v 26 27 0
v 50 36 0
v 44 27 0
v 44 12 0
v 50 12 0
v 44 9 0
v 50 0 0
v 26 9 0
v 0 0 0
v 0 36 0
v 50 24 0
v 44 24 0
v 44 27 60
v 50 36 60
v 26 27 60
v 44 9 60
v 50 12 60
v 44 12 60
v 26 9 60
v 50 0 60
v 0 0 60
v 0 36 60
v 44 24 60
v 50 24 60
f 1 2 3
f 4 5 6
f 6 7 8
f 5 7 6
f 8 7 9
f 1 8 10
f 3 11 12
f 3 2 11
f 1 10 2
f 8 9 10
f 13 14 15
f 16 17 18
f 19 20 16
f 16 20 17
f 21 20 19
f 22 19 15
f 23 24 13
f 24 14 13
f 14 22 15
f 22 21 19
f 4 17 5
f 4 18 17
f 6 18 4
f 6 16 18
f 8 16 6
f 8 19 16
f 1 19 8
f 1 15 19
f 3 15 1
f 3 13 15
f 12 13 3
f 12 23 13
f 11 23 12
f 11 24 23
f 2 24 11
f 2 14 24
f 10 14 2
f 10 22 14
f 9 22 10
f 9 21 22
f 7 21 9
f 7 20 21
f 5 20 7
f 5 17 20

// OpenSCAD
$fn = 32;

// ----------------------------------------------------------------------
// T-slot rail: 50 x 36 mm section, 60 mm long
// ----------------------------------------------------------------------

// --- parameters (mm) ---
profile_height = 60;      // extrusion height
profile_points = 12;      // points of the closed outline

profile = [[0, 0], [50, 0], [50, 12], [44, 12], [44, 9], [26, 9], [26, 27], [44, 27], [44, 24], [50, 24], [50, 36], [0, 36]];  // single closed polygon, 12 points, counter clockwise

// --- the one profile operation ---
linear_extrude(height = profile_height) polygon(points = profile);
